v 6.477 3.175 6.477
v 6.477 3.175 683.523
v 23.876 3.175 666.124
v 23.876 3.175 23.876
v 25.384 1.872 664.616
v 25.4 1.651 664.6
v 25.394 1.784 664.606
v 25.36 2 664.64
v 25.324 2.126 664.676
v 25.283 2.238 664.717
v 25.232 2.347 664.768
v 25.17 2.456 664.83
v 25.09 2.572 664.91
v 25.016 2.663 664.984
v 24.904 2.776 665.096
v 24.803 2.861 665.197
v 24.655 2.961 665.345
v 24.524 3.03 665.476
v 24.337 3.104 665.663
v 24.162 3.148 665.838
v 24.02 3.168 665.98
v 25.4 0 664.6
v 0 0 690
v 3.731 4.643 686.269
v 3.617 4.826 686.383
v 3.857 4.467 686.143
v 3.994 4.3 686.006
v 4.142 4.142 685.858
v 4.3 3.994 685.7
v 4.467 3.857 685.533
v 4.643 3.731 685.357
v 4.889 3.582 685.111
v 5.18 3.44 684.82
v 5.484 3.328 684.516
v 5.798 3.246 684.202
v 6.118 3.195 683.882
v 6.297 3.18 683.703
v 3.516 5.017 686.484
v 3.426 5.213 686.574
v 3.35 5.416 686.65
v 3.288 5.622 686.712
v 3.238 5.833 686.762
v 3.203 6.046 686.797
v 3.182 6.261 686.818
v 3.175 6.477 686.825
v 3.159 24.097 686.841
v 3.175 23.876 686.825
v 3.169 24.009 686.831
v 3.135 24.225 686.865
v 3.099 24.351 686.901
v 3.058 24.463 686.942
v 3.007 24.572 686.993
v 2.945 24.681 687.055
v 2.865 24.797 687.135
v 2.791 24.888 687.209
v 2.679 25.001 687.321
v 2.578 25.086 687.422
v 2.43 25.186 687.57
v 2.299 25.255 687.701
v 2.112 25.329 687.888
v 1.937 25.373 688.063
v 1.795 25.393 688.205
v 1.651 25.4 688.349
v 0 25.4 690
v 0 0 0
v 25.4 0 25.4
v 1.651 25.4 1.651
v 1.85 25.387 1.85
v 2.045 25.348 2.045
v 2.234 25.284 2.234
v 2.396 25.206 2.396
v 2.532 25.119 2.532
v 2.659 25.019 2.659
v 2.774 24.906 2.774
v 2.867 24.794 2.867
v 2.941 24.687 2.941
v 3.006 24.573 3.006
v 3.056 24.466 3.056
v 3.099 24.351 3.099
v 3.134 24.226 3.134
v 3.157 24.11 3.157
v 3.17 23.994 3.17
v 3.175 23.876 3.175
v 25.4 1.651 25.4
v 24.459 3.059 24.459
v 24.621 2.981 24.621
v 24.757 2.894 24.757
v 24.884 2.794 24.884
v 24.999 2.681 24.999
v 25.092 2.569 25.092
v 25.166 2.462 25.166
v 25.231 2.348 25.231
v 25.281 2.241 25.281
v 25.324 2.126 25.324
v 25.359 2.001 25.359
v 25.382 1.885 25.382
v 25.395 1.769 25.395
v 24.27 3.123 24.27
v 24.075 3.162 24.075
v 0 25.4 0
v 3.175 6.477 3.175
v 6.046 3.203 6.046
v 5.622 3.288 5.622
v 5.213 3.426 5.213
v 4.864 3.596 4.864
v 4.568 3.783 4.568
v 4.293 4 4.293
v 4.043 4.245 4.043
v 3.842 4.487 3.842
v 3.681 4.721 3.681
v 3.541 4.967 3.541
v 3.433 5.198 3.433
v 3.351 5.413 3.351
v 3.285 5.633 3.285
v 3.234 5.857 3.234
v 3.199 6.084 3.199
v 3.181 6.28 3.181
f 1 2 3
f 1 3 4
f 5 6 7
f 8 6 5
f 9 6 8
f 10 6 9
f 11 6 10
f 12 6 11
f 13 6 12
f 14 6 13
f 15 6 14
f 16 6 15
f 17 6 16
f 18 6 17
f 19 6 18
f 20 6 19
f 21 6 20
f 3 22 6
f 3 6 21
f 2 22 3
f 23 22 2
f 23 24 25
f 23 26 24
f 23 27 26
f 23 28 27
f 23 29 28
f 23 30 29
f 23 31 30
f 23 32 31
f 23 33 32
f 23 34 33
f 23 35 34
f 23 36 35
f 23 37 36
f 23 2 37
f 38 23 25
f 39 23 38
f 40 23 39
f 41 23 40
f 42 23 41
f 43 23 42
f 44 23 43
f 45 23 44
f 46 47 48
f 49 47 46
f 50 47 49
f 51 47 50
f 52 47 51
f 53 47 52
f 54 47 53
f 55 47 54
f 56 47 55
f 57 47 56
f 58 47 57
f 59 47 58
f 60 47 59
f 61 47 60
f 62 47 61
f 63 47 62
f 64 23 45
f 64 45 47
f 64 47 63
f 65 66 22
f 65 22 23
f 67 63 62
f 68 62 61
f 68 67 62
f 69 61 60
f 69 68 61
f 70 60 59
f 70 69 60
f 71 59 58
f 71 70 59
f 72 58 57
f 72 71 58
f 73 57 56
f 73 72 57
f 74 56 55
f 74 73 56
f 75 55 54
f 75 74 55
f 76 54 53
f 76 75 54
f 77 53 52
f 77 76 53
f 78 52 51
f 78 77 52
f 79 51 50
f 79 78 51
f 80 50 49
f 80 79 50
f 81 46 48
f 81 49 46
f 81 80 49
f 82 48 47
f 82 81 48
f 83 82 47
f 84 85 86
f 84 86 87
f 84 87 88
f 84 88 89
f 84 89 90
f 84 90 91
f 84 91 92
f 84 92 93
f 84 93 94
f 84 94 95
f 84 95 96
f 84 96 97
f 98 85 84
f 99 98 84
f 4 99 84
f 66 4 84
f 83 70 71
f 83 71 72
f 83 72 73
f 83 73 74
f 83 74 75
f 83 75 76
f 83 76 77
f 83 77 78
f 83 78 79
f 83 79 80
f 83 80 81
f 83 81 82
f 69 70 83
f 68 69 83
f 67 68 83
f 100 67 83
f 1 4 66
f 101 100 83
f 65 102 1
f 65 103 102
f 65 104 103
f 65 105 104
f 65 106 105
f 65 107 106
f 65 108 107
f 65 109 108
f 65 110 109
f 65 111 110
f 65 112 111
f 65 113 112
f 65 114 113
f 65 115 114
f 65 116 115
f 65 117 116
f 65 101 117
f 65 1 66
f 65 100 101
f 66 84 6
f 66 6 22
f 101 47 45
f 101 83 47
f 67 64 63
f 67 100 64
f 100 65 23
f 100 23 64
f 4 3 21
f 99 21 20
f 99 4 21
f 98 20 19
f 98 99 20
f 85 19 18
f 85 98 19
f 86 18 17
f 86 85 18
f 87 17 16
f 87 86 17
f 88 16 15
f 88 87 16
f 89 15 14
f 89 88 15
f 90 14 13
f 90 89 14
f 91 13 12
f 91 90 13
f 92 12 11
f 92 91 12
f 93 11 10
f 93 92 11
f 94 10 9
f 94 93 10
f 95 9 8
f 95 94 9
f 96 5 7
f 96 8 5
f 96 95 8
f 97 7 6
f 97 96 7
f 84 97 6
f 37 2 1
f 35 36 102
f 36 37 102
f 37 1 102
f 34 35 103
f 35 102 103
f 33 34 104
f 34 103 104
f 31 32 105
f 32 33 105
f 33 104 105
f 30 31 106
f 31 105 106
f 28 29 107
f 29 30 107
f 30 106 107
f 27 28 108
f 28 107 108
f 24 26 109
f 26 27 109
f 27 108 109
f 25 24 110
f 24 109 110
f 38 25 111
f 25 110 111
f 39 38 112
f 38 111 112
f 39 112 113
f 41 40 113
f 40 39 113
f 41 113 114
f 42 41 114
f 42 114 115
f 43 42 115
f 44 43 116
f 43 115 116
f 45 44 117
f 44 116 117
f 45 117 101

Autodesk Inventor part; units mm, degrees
ref_plane "Start Plane" through (0, 0, 0) normal (0, 0, 1) x (1, 0, 0)
ref_plane "End Plane" through (0, 0, 690) normal (0, 0, 1) x (1, 0, 0)
sketch "Sketch" plane through (0, 0, 0) normal (0, 0, 1) x (1, 0, 0)
  line L0 (25.4, 0) -> (0, 0)
  line L1 (0, 0) -> (0, 25.4)
  line L2 (0, 25.4) -> (1.651, 25.4)
  line L3 (3.175, 23.876) -> (3.175, 6.477)
  line L4 (6.477, 3.175) -> (23.876, 3.175)
  line L5 (25.4, 1.651) -> (25.4, 0)
  line L6 (0, -11.0414) -> (0, 31.5385) construction
  line L7 (-11.0414, 0) -> (31.5385, 0) construction
  arc A0 (3.175, 6.477) -> (6.477, 3.175) centre (6.477, 6.477) ccw
  arc A1 (3.175, 23.876) -> (1.651, 25.4) centre (1.651, 23.876) ccw
  arc A2 (25.4, 1.651) -> (23.876, 3.175) centre (23.876, 1.651) ccw
  line L8 (0, 40.0545) -> (0, -19.5574) construction
  line L9 (-19.5574, 0) -> (40.0545, 0) construction
  point P0 (3.175, 25.4)
  point P1 (3.175, 3.175)
  point P2 (25.4, 3.175)
  dimension "d0" = 25.4
  dimension "d1" = 25.4
  dimension "d2" = 3.175
  dimension "d3" = 3.175
  dimension "d10" = 0
  dimension "d11" = 0
  dimension "d14" = 3.302
  dimension "d15" = 1.524
extrude "Body" add sketch "Sketch" along normal up to surface (690 mm away) from surface at 0
sketch "Sketch3" plane through (0, 0, 0) normal (0, 0, 1) x (1, 0, 0)
  line L0 (0, 0) -> (10, 0)
ref_plane "Work Plane3" through (0, 0, 0) normal (0, -1, 0) x (1, 0, 0)
ref_plane "Work Plane4" through (0, 12.7, 0) normal (0.7071, 0, -0.7071) x (-0.7071, 0, -0.7071)
split "Split1" plane through (0, 12.7, 0) removes the side toward (0.7071, 0, -0.7071)
ref_plane "Work Plane5" through (0, 12.7, 690) normal (0.7071, 0, 0.7071) x (0.7071, 0, -0.7071)
split "Split2" plane through (0, 12.7, 690) removes the side toward (0.7071, 0, 0.7071)
sketch "Sketch4" plane through (0, 0, 0) normal (0, -1, 0) x (1, 0, 0)
  line L0 (-2, 0) -> (12, 0) projected
  line L1 (-2, 690) -> (12, 690) projected
  dimension "d17" = 690
equation "\"d0\" = G_H"
equation "\"d1\" = G_H"
equation "\"d2\" = G_T"
equation "\"d3\" = G_T"
equation "\"d14\" = G_IR"
equation "\"d15\" = G_ER"
equation "\"d4\" = G_L"
equation "\"G_H\" = 25.4"
equation "\"G_T\" = 3.175"
equation "\"G_ER\" = 1.524"
equation "\"G_IR\" = 3.302"
equation "\"G_L\" = d17"
equation "\"ex\" = 0"
equation "\"G_OFFSET_START\" = 0"
equation "\"G_OFFSET_END\" = 0"
equation "\"d13\" = G_OFFSET_END + B_L"
equation "\"B_L\" = 690"
properties part number "AISC - L 1 x 1 x 1/8 - 27.165" material "Steel, Mild"
